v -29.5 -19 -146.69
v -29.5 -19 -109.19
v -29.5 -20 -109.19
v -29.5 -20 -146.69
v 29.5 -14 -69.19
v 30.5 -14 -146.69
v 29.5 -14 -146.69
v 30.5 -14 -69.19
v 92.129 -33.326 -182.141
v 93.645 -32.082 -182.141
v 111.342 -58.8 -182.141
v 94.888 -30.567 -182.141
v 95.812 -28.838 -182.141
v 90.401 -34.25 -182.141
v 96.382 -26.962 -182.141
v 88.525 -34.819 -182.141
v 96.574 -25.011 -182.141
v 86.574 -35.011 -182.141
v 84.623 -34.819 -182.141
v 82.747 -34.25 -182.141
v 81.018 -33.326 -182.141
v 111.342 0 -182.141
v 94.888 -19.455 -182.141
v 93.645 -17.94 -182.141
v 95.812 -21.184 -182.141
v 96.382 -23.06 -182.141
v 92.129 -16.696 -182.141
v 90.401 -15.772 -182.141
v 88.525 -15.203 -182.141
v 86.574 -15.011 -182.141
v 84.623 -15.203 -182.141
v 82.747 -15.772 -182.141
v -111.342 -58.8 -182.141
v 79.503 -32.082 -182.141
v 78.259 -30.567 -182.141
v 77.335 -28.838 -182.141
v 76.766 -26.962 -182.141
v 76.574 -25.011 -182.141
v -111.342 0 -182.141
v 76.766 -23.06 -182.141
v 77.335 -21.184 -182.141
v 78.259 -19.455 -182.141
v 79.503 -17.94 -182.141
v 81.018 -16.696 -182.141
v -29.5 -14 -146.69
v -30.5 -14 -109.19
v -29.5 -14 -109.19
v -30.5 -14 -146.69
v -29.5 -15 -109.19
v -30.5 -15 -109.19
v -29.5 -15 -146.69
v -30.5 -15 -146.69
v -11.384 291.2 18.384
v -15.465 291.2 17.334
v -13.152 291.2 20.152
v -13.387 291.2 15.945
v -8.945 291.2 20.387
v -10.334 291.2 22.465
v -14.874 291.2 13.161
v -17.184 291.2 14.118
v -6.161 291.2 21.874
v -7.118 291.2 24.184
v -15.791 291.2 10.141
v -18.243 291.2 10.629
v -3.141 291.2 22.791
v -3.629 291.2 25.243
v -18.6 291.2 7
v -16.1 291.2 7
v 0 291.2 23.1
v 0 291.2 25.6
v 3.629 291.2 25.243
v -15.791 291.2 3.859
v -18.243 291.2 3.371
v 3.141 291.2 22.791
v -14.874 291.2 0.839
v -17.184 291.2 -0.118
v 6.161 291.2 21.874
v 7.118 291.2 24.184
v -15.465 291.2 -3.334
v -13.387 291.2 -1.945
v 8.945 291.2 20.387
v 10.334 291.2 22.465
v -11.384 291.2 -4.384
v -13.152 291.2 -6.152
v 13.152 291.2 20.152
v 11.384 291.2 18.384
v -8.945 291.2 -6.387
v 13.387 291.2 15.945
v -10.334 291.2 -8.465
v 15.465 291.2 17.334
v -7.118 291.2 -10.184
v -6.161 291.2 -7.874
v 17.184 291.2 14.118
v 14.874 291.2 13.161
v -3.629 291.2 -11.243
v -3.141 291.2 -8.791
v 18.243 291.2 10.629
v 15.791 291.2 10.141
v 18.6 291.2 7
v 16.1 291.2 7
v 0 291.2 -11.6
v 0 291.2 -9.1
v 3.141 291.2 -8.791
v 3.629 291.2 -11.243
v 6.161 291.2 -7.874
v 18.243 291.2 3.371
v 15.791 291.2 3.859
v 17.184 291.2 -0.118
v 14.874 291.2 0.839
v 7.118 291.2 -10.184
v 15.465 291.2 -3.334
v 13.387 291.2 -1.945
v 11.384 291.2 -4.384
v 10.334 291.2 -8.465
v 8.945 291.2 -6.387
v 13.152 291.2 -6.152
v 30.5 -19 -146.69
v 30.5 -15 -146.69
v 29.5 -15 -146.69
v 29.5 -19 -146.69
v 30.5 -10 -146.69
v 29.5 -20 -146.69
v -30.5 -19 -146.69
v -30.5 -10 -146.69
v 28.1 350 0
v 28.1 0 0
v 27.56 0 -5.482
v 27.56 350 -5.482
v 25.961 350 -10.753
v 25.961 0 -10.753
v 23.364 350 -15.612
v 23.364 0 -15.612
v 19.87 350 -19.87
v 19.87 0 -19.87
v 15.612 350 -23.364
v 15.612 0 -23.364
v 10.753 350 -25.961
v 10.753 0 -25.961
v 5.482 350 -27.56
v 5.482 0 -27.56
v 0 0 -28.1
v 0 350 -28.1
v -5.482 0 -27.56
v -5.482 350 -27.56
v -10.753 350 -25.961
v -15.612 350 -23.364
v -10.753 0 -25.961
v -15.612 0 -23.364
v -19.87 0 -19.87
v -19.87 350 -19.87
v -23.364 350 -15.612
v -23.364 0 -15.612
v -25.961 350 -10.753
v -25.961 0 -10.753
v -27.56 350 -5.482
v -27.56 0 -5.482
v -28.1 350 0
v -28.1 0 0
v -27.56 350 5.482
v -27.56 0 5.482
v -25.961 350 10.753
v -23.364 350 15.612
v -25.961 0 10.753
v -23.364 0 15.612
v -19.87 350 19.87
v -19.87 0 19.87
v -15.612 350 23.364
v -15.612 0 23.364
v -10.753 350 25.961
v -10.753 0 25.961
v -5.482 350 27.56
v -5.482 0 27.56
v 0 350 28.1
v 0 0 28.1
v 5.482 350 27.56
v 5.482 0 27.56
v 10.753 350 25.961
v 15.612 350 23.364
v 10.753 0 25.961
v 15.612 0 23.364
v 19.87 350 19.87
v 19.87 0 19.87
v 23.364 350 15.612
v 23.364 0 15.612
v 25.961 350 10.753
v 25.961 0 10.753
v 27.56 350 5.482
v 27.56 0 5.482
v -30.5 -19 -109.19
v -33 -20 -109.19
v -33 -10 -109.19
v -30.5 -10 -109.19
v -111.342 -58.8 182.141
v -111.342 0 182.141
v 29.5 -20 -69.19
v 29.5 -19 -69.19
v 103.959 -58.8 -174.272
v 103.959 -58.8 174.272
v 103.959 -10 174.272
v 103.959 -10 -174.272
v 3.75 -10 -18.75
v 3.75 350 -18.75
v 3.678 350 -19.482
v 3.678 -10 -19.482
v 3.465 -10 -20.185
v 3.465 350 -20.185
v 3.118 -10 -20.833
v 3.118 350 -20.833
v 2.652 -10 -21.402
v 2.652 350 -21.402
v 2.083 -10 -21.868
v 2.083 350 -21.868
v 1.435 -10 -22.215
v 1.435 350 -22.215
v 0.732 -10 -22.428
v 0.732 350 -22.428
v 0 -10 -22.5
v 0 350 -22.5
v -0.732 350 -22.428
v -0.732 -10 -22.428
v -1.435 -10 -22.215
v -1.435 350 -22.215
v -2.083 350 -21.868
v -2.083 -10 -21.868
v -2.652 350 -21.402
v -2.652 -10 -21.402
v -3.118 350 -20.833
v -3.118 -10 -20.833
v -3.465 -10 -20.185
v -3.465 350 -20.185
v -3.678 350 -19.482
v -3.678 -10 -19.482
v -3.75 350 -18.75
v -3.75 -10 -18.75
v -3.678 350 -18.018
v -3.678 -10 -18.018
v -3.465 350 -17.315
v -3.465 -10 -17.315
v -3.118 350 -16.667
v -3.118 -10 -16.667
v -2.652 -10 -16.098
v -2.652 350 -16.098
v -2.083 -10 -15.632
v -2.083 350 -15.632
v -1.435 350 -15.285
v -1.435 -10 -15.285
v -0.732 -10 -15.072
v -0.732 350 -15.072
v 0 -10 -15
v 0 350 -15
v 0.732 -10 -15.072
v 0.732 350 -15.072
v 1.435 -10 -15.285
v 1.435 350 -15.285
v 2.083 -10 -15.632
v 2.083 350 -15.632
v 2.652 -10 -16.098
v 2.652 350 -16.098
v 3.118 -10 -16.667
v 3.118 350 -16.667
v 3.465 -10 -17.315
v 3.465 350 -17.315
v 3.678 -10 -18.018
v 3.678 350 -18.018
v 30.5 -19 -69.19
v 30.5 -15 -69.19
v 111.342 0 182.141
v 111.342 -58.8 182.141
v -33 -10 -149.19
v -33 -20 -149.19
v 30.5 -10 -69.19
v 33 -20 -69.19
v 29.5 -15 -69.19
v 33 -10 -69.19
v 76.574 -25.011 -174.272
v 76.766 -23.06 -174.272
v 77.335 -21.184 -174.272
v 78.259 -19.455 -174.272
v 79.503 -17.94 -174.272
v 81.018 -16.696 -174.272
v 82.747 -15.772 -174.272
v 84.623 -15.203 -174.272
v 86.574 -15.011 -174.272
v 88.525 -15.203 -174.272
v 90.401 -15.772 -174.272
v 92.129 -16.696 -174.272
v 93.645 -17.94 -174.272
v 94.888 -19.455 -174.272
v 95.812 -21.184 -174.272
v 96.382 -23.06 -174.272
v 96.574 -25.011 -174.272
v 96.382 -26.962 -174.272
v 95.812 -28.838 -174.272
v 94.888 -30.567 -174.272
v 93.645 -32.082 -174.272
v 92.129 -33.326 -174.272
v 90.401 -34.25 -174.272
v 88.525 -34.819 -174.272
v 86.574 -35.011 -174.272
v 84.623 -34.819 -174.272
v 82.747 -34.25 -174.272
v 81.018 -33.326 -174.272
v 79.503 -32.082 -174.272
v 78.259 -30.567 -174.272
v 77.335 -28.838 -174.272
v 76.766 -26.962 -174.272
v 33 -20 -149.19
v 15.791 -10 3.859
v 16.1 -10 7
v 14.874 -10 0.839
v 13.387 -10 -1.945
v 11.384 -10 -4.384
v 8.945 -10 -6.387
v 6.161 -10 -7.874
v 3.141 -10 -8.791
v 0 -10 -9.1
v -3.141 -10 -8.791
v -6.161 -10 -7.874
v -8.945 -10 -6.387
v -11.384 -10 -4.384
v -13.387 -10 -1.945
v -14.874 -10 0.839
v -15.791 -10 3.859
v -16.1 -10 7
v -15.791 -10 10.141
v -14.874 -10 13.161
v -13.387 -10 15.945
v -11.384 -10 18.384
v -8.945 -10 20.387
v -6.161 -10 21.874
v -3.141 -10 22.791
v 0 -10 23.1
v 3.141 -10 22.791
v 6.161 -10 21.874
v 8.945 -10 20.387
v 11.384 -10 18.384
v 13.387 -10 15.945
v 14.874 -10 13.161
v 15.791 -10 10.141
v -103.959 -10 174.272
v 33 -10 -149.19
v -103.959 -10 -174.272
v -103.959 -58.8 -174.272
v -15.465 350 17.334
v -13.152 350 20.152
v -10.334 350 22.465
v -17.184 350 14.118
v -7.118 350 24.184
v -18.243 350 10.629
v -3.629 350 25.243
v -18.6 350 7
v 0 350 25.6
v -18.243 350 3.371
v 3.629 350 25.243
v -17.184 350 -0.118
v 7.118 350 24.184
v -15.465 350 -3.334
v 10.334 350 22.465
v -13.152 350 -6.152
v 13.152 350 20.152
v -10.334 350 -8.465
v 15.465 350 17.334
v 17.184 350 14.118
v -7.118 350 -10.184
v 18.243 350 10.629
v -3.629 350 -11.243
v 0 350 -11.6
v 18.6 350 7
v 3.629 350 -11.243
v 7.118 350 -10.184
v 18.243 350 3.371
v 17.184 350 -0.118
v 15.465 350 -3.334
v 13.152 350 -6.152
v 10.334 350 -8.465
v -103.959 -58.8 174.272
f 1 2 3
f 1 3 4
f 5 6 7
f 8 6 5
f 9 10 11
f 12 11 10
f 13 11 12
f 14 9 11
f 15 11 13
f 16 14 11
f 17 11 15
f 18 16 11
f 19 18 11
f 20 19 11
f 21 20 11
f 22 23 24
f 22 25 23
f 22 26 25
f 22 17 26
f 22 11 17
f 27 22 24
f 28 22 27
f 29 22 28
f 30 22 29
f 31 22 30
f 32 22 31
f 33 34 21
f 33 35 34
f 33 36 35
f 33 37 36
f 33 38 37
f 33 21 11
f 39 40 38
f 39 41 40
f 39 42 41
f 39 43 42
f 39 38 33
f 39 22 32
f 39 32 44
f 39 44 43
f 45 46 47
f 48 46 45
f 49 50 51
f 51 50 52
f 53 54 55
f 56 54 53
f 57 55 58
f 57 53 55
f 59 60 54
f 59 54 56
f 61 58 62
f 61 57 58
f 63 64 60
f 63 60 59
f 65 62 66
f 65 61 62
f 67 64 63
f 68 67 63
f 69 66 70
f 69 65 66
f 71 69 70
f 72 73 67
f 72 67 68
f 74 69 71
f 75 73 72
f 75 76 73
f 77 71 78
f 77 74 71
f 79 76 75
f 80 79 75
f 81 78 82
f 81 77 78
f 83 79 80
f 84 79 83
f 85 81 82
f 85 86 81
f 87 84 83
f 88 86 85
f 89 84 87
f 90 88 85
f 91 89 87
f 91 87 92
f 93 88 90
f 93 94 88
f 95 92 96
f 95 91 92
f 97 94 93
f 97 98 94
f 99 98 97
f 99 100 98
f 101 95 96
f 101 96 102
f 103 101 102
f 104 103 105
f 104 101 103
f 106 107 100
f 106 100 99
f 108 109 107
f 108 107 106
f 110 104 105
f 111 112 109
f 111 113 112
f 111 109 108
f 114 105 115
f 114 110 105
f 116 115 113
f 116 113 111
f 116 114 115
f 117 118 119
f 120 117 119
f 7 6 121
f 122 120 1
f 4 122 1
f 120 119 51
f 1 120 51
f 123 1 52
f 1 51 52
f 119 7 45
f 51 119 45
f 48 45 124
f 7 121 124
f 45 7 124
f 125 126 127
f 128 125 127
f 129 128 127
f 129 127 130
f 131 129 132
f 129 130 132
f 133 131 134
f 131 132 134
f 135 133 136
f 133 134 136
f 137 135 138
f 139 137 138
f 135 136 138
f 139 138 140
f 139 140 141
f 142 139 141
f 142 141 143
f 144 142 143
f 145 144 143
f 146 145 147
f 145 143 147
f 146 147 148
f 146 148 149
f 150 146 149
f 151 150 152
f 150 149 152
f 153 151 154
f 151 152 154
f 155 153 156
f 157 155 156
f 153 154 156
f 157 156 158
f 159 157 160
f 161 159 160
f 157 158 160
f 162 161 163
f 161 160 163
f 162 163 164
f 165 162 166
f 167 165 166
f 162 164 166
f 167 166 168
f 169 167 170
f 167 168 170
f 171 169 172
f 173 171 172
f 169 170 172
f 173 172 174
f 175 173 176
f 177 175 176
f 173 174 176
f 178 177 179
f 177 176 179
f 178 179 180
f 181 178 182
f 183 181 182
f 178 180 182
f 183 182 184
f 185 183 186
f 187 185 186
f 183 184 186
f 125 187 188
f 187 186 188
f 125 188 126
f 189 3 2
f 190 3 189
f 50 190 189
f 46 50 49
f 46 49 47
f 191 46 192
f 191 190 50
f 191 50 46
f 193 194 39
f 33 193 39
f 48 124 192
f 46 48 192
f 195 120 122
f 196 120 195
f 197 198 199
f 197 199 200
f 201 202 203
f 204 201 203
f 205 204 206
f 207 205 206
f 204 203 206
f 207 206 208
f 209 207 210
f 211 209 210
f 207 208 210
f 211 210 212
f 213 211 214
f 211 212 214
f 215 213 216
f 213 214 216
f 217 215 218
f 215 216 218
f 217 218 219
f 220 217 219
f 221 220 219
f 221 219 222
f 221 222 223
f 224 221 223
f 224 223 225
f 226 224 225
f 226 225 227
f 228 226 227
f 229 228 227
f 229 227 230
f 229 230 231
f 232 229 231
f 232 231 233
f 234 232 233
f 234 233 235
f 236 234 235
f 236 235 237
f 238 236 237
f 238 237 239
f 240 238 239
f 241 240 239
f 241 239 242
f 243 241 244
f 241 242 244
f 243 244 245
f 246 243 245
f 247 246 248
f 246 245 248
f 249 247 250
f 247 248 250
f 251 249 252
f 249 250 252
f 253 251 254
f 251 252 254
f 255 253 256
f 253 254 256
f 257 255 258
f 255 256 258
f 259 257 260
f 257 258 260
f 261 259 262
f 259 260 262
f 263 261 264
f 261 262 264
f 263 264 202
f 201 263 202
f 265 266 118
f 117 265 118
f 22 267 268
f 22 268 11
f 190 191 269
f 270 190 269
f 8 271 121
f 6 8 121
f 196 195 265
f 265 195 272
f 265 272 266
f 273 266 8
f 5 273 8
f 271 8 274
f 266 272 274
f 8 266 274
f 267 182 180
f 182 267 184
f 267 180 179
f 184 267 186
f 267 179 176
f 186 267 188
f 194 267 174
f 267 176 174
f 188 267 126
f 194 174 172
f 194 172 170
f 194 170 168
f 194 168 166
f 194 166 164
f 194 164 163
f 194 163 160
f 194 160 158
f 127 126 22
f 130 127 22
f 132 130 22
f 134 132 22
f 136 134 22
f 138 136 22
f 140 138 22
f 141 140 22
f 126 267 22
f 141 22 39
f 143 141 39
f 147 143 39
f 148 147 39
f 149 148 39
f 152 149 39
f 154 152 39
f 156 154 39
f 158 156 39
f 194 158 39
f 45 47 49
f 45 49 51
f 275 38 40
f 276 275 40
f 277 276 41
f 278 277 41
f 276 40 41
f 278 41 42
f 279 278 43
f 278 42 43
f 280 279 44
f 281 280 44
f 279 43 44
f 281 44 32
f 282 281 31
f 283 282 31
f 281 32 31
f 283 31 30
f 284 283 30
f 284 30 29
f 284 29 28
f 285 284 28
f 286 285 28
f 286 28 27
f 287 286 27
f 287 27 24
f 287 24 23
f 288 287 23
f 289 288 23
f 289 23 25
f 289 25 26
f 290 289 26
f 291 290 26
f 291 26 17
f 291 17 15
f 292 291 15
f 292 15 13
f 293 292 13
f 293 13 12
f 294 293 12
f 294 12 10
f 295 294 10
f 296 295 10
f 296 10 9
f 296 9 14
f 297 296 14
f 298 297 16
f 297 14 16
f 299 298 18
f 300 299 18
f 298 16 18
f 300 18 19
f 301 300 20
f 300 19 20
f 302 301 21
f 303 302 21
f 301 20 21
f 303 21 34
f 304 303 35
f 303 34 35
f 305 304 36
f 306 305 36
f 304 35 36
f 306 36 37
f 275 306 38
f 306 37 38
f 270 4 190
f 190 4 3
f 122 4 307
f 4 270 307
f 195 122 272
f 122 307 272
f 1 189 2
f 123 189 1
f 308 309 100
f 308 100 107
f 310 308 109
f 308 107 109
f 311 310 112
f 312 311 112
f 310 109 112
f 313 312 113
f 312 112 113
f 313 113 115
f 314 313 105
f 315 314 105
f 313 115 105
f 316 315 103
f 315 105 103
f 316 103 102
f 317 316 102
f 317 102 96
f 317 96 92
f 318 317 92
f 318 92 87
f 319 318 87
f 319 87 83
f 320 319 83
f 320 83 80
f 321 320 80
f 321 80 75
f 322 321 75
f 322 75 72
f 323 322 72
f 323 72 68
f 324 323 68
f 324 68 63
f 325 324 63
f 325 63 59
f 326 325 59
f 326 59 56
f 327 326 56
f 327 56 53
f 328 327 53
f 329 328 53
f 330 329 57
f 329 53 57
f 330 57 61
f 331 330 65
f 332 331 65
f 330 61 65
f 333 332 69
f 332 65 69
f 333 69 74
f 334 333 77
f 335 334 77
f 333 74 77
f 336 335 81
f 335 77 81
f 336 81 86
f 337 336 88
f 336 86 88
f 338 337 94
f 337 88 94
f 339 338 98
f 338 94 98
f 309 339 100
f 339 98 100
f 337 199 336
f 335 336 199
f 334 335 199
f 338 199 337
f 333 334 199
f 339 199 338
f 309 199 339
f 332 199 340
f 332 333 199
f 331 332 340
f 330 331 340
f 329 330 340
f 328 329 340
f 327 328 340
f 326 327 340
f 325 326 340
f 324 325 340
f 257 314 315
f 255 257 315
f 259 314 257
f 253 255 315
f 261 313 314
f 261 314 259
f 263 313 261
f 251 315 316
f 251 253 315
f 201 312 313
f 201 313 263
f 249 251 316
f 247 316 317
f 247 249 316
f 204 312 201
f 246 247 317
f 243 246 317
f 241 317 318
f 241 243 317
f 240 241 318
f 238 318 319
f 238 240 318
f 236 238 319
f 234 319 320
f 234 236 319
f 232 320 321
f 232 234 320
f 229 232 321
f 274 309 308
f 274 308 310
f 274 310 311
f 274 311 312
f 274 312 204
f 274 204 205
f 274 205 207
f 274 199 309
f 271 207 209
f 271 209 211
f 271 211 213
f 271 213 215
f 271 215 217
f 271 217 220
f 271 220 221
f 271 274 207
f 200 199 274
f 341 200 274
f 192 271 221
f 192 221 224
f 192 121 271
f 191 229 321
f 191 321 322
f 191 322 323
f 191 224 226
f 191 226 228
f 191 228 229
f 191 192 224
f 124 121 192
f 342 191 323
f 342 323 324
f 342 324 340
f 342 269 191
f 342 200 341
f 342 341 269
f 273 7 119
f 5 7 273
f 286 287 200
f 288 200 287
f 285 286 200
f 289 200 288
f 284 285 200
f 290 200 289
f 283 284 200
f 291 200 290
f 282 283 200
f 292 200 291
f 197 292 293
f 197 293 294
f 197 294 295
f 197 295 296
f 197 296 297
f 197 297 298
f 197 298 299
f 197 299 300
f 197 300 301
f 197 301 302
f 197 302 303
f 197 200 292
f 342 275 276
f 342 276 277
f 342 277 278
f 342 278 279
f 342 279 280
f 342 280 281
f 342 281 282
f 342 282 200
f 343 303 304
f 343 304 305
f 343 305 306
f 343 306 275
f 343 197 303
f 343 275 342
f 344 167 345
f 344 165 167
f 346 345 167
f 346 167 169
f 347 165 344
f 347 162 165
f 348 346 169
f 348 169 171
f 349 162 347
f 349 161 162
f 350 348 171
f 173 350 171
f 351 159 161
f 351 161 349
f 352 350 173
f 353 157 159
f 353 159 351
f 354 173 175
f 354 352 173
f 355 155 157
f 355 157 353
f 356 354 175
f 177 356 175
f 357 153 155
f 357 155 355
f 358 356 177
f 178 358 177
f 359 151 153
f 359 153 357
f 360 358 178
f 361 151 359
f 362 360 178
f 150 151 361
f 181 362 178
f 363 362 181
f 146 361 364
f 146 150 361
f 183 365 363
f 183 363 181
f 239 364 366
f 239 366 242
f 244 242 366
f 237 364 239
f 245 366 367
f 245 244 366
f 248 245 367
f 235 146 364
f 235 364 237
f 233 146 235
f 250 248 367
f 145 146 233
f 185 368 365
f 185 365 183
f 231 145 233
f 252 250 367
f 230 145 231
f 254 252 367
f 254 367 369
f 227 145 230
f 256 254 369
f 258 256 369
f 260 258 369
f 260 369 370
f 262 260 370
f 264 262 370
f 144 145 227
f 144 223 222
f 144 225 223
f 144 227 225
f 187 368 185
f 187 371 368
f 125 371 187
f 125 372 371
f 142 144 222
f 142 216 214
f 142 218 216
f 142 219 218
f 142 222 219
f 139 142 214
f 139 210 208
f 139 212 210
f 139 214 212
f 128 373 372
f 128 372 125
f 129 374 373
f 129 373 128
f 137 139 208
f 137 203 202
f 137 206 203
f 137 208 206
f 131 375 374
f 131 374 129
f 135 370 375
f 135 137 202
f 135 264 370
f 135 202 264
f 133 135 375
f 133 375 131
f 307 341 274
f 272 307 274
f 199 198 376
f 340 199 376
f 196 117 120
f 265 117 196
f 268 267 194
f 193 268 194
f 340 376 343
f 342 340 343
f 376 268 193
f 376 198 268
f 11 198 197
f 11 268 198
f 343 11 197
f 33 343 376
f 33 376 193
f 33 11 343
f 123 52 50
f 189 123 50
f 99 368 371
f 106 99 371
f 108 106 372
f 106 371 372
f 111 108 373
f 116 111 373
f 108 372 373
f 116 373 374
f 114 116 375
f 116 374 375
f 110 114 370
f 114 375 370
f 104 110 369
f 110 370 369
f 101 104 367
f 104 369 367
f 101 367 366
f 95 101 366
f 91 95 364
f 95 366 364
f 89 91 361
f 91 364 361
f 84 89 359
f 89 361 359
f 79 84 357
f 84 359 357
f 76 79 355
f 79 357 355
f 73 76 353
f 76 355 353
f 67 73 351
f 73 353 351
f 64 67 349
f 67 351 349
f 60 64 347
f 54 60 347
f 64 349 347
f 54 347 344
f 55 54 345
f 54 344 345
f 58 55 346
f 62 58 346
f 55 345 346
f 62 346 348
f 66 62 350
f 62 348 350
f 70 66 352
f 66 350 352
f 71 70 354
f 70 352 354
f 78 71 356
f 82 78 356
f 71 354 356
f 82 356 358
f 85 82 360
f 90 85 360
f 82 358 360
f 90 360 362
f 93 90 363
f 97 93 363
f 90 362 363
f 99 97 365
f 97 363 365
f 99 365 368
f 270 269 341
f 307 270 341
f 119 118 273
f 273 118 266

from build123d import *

# Parameters (mm, degrees)
SKETCH1_R           = 28.1
BOSS_EXTRUDE1_DEPTH = 350
SKETCH2_R           = 18.6
CUT_EXTRUDE1_DEPTH  = 58.8
SKETCH3_W           = 222.683092022
SKETCH3_H           = 364.2827524
BOSS_EXTRUDE2_DEPTH = 58.8
SKETCH4_W           = 207.917403516
SKETCH4_H           = 348.54429772
CUT_EXTRUDE2_DEPTH  = 48.8
SKETCH5_R           = 16.1
CUT_EXTRUDE3_DEPTH  = 350
SKETCH6_R           = 3.75
CUT_EXTRUDE5_DEPTH  = 400
BOSS_EXTRUDE3_DEPTH = 10
SKETCH8_R           = 10
CUT_EXTRUDE7_DEPTH  = 10
SKETCH9_W           = 37.5
SKETCH9_H           = 1
BOSS_EXTRUDE4_DEPTH = 1
SKETCH10_W          = 37.5
SKETCH10_H          = 1
BOSS_EXTRUDE5_DEPTH = 1
SKETCH11_W          = 77.5
SKETCH11_H          = 1
BOSS_EXTRUDE6_DEPTH = 1
SKETCH12_W          = 77.5
SKETCH12_H          = 1
BOSS_EXTRUDE7_DEPTH = 1


with BuildPart() as part:
    # Sketch1 → Boss-Extrude1 (new body)
    with BuildSketch(Plane(origin=(0, 0, 0), x_dir=(1, 0, 0), z_dir=(0, 1, 0))):
        Circle(SKETCH1_R)
    extrude(amount=BOSS_EXTRUDE1_DEPTH)

    # Sketch2 → Cut-Extrude1 (cut)
    with BuildSketch(Plane(origin=(0, 350, 0), x_dir=(1, 0, 0), z_dir=(0, 1, 0))):
        with Locations((0, -7)):
            Circle(SKETCH2_R)
    extrude(amount=-CUT_EXTRUDE1_DEPTH, mode=Mode.SUBTRACT)

    # Sketch3 → Boss-Extrude2 (add)
    with BuildSketch(Plane(origin=(0, 0, 0), x_dir=(-1, 0, 0), z_dir=(0, -1, 0))):
        Rectangle(SKETCH3_W, SKETCH3_H)
    extrude(amount=BOSS_EXTRUDE2_DEPTH)

    # Sketch4 → Cut-Extrude2 (cut)
    with BuildSketch(Plane(origin=(0, -58.8, 0), x_dir=(-1, 0, 0), z_dir=(0, -1, 0))):
        Rectangle(SKETCH4_W, SKETCH4_H)
    extrude(amount=-CUT_EXTRUDE2_DEPTH, mode=Mode.SUBTRACT)

    # Sketch5 → Cut-Extrude3 (cut)
    with BuildSketch(Plane(origin=(0, 291.2, 0), x_dir=(1, 0, 0), z_dir=(0, 1, 0))):
        with Locations((0, -7)):
            Circle(SKETCH5_R)
    extrude(amount=-CUT_EXTRUDE3_DEPTH, mode=Mode.SUBTRACT)

    # Sketch6 → Cut-Extrude5 (cut)
    with BuildSketch(Plane(origin=(0, 350, 0), x_dir=(1, 0, 0), z_dir=(0, 1, 0))):
        with Locations((0, 18.75)):
            Circle(SKETCH6_R)
    extrude(amount=-CUT_EXTRUDE5_DEPTH, mode=Mode.SUBTRACT)

    # Sketch7 → Boss-Extrude3 (add)
    with BuildSketch(Plane(origin=(0, -10, 0), x_dir=(-1, 0, 0), z_dir=(0, -1, 0))):
        Polygon((-33, 69.189999926), (-30.5, 69.189999926), (-30.5, 146.689999926), (30.5, 146.689999926), (30.5, 109.189999926), (33, 109.189999926), (33, 149.189999926), (-33, 149.189999926), align=None)
    extrude(amount=BOSS_EXTRUDE3_DEPTH)

    # Sketch8 → Cut-Extrude7 (cut)
    with BuildSketch(Plane(origin=(0, 0, -182.1413762), x_dir=(-1, 0, 0), z_dir=(0, 0, -1))):
        with Locations((-86.573671766, -25.011155335)):
            Circle(SKETCH8_R)
    extrude(amount=-CUT_EXTRUDE7_DEPTH, mode=Mode.SUBTRACT)

    # Sketch9 → Boss-Extrude4 (add)
    with BuildSketch(Plane(origin=(-30.5, 0, 0), x_dir=(0, 0, -1), z_dir=(1, 0, 0))):
        with Locations((127.939999926, -19.5)):
            Rectangle(SKETCH9_W, SKETCH9_H)
    extrude(amount=BOSS_EXTRUDE4_DEPTH)

    # Sketch10 → Boss-Extrude5 (add)
    with BuildSketch(Plane(origin=(-30.5, 0, 0), x_dir=(0, 0, -1), z_dir=(1, 0, 0))):
        with Locations((127.939999926, -14.5)):
            Rectangle(SKETCH10_W, SKETCH10_H)
    extrude(amount=BOSS_EXTRUDE5_DEPTH)

    # Sketch11 → Boss-Extrude6 (add)
    with BuildSketch(Plane.ZY.offset(-30.5)):
        with Locations((-107.939999926, -19.5)):
            Rectangle(SKETCH11_W, SKETCH11_H)
    extrude(amount=BOSS_EXTRUDE6_DEPTH)

    # Sketch12 → Boss-Extrude7 (add)
    with BuildSketch(Plane.ZY.offset(-30.5)):
        with Locations((-107.939999926, -14.5)):
            Rectangle(SKETCH12_W, SKETCH12_H)
    extrude(amount=BOSS_EXTRUDE7_DEPTH)


solid = part.part
